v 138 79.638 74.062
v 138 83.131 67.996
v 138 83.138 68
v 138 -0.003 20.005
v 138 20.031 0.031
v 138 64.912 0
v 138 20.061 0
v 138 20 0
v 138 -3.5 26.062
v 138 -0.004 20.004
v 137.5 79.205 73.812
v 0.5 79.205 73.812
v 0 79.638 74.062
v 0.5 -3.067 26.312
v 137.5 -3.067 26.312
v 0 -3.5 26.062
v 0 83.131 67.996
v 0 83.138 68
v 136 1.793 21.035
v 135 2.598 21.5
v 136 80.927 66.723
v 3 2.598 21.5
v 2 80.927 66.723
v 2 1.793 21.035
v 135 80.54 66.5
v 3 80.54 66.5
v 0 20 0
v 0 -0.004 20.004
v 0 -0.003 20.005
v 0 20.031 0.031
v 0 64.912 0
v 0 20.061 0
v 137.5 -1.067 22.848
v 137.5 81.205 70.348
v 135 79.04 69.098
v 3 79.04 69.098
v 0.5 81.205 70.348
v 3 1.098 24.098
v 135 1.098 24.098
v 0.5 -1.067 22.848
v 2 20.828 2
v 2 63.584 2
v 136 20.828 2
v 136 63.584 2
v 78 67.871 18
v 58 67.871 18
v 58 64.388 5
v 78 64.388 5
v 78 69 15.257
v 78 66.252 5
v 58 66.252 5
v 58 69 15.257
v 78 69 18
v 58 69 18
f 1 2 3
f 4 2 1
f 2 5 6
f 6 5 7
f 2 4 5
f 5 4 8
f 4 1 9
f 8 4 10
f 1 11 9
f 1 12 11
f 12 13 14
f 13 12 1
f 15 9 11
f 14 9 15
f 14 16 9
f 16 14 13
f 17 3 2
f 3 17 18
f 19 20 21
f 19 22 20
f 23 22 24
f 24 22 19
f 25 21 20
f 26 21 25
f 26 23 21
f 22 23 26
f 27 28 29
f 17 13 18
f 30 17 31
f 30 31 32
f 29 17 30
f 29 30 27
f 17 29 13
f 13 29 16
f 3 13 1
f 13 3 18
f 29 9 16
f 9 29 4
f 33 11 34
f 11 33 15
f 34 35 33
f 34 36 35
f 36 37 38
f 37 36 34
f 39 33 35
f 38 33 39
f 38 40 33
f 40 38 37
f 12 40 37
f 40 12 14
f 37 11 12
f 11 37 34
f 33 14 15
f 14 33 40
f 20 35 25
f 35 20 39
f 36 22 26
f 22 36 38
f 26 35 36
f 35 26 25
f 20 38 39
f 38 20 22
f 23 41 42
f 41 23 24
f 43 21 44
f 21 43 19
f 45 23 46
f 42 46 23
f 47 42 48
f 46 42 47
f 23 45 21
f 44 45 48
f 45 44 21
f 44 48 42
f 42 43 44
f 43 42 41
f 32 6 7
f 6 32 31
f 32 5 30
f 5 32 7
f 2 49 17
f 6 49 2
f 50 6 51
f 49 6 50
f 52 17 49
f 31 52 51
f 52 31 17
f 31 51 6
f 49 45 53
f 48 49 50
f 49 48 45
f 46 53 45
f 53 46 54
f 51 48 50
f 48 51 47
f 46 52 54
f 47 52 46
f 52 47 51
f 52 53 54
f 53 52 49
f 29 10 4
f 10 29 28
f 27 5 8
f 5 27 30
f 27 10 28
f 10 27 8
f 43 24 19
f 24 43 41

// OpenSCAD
//translate([0,0,20])
//rotate([30,0,0])
//color("red")
//translate([0,3,4])
//#cube([136,94,1]);

//difference(){
//    
//    color("red")
//    cube([138,94,100]);
//    
//    translate([0,0,20])
//    rotate([30,0,0])
//    color("red")
//    translate([-1,3,+5])
//    cube([140,121,67]);
//    
//    translate([-1,81.8,73.7])
//    cube([140,14,10]);
//    
//    translate([0,0,20])
//    rotate([30,0,0])
//    translate([1,4,-8])
//    cube([136,94,23]);
//    
//    
//    translate([1,2,+2])
//    cube([136,87,61]);
//}
//



//#cube([136,94,1]);

a=5;

translate([0,0,20])
rotate([30,0,0])
difference(){
    
    cube([138,96,a+2]);
    
    translate([0.5,0.5,a-2])
    cube([137,95,a-0.9]);
    
    translate([3,3,-1])
    cube([132,90,a+1]);
}

// Parede da frente
translate([0,20.00,0])
rotate([45,0,0])
cube([138,2,28.29]);

// Paredes
difference(){
    
    union(){
        // Parede Esquerda
        rotate([30,0,0])
        translate([0,11,-52])
        cube([2,95,70]);
        
        // Parede Direita
        rotate([30,0,0])
        translate([136,11,-52])
        cube([2,95,70]);
        
        // Parede De Tras
        rotate([-15,0,0])
        translate([0,+60.9,15.2])
        cube([138,2,72]);
        
        // Chao
        rotate([0,0,0])
        translate([0,20,0])
        cube([137,47,2]);
    }
    
    // Corte da frente
    translate([-44,12,0])
    rotate([45,0,0])
    translate([40,-1.3,-8])
    cube([146,7,41]);
    
    // Corte de baixo
    translate([-10,-10,-100])
    cube([1000,1000,100]);
    
    // Corte de tras
    translate([-1,83.14,-1])
    cube([144,35.0,83]);
    
    // Corte de tras na diagonal
    rotate([-15,0,0])
    translate([-1,62.7,+9])
    cube([144,35.0,83]);
    
    // Buraco para cabo
    translate([58,59,5])
    cube([20, 10, 13]);
    
}
